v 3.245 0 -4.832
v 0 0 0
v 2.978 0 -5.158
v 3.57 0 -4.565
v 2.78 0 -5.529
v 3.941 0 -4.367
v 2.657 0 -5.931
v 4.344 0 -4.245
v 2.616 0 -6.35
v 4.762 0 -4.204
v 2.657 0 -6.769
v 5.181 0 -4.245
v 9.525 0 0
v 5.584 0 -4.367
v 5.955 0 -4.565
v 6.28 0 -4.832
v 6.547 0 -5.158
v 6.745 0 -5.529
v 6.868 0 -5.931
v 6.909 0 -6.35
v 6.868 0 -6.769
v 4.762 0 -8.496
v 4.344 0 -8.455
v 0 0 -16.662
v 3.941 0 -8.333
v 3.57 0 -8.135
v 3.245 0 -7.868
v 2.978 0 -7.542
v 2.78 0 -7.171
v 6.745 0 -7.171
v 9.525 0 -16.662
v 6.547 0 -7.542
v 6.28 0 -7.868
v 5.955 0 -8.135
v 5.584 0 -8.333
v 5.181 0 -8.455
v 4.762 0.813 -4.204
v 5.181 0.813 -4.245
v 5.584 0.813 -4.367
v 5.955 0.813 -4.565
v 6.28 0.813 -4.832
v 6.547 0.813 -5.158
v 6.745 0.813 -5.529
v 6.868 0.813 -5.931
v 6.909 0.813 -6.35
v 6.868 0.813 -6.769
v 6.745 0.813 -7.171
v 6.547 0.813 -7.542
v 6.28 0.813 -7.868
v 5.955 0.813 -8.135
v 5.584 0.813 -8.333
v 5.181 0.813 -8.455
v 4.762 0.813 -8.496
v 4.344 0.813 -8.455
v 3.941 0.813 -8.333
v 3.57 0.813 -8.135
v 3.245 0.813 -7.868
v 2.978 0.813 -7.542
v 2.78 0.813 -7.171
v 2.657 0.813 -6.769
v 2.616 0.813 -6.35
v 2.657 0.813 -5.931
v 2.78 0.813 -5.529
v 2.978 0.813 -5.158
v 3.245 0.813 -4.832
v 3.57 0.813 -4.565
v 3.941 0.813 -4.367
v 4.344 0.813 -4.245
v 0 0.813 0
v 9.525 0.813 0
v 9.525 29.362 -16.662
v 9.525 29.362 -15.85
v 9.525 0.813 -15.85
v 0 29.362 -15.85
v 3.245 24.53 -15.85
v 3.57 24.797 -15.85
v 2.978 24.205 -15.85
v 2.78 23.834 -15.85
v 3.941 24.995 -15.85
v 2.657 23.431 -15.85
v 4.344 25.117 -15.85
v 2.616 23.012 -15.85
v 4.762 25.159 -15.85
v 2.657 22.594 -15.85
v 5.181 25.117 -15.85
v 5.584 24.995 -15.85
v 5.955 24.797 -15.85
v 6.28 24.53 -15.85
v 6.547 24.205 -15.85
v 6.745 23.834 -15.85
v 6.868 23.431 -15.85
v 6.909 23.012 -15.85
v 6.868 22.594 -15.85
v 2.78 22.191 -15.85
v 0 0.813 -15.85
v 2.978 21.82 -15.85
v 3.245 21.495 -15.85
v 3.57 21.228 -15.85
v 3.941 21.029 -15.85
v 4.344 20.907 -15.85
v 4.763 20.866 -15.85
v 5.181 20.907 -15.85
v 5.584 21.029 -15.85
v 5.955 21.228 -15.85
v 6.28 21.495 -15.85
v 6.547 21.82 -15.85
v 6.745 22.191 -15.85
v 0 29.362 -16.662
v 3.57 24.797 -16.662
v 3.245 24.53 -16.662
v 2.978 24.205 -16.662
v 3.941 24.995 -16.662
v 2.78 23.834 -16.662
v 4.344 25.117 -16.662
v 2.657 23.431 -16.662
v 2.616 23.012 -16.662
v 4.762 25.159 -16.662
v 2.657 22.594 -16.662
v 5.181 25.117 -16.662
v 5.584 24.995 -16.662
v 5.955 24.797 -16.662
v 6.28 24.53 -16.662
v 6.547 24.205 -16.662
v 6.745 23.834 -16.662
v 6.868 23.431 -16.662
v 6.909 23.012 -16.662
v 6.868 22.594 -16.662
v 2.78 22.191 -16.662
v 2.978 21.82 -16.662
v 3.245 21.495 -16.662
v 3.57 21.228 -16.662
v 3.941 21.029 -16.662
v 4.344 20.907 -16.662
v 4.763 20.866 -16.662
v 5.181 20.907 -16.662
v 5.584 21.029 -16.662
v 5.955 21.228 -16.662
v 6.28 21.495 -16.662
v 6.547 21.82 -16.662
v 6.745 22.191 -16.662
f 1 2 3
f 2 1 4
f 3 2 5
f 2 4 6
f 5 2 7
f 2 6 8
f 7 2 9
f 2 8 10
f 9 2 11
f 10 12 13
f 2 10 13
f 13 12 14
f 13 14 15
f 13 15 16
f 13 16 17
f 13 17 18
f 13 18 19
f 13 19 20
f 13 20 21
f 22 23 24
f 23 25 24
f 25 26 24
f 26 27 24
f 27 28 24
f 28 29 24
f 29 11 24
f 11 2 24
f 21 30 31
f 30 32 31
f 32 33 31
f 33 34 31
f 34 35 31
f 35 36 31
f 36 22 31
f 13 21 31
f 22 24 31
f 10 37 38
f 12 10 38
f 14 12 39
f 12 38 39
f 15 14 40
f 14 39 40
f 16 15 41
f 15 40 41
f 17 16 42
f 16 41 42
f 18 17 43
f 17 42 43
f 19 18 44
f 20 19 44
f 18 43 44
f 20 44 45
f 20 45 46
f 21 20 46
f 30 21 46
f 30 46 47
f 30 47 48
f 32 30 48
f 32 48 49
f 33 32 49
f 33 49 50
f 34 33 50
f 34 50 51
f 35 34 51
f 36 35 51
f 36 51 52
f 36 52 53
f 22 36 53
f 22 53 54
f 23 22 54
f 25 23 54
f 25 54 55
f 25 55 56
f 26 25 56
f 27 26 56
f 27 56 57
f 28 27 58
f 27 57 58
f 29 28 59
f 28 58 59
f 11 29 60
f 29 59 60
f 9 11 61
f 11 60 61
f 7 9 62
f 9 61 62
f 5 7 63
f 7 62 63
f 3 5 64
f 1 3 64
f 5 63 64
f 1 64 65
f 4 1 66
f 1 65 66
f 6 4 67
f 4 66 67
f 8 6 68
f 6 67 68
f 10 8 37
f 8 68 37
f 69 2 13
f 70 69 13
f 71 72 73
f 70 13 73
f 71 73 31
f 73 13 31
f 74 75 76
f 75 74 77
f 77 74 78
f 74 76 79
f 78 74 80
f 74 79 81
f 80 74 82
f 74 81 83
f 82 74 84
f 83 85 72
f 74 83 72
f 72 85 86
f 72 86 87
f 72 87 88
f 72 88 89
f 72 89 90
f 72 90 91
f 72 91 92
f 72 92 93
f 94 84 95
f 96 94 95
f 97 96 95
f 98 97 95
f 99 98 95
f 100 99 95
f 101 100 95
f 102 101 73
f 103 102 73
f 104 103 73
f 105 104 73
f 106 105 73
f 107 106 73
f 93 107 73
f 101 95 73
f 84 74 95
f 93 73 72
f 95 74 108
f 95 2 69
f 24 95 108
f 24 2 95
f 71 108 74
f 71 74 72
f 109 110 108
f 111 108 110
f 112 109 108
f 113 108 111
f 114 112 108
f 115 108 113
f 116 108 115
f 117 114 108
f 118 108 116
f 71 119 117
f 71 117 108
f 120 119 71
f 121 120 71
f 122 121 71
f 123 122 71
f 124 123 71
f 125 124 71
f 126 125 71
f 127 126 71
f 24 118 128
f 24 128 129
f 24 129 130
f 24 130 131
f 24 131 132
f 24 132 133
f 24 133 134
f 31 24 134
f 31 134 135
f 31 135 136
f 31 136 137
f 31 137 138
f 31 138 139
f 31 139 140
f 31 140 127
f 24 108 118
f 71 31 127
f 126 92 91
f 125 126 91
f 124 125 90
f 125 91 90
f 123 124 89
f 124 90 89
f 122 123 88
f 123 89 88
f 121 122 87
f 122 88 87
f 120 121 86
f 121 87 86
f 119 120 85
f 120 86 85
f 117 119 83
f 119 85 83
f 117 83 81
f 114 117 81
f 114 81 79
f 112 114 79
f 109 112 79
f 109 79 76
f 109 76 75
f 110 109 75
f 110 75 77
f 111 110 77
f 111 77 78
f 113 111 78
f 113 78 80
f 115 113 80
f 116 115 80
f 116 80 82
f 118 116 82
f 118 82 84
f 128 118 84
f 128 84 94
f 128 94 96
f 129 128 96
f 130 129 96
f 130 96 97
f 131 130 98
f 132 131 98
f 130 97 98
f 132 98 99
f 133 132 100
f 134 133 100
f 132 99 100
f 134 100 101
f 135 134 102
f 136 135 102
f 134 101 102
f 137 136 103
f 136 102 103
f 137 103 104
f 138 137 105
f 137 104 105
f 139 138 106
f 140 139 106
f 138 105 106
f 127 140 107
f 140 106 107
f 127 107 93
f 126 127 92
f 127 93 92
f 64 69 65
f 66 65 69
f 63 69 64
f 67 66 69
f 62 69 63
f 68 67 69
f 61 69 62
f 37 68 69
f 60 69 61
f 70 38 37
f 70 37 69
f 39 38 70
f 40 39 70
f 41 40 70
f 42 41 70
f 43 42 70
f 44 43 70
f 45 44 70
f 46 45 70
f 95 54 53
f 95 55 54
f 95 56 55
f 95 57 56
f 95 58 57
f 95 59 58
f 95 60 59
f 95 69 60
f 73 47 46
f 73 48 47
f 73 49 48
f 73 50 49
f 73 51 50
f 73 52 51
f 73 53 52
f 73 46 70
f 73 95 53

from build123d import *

# Parameters (mm, degrees)
SKETCH1_W           = 9.525
SKETCH1_H           = 16.6624
BOSS_EXTRUDE1_DEPTH = 0.8128
SKETCH2_W           = 9.525
SKETCH2_H           = 0.8128
BOSS_EXTRUDE2_DEPTH = 28.5496
SKETCH3_R           = 2.1463
CUT_EXTRUDE1_DEPTH  = 35.401175255
SKETCH4_R           = 2.1463
CUT_EXTRUDE2_DEPTH  = 35.699942059


with BuildPart() as part:
    # Sketch1 → Boss-Extrude1 (new body)
    with BuildSketch(Plane(origin=(0, 0, 0), x_dir=(1, 0, 0), z_dir=(0, 1, 0))):
        with Locations((4.7625, 8.3312)):
            Rectangle(SKETCH1_W, SKETCH1_H)
    extrude(amount=BOSS_EXTRUDE1_DEPTH)

    # Sketch2 → Boss-Extrude2 (add)
    with BuildSketch(Plane(origin=(0, 0.8128, 0), x_dir=(1, 0, 0), z_dir=(0, 1, 0))):
        with Locations((4.7625, 16.256)):
            Rectangle(SKETCH2_W, SKETCH2_H)
    extrude(amount=BOSS_EXTRUDE2_DEPTH)

    # Sketch3 → Cut-Extrude1 (cut, through all)
    with BuildSketch(Plane(origin=(0, 0.8128, 0), x_dir=(1, 0, 0), z_dir=(0, 1, 0))):
        with Locations(Location((4.7625, 6.35, 0), (0, 0, 270))):
            Circle(SKETCH3_R)
    extrude(amount=-CUT_EXTRUDE1_DEPTH, mode=Mode.SUBTRACT)

    # Sketch4 → Cut-Extrude2 (cut, through all)
    with BuildSketch(Plane.XY.offset(-15.8496)):
        with Locations((4.7625, 23.0124)):
            Circle(SKETCH4_R)
    extrude(amount=-CUT_EXTRUDE2_DEPTH, mode=Mode.SUBTRACT)


solid = part.part
